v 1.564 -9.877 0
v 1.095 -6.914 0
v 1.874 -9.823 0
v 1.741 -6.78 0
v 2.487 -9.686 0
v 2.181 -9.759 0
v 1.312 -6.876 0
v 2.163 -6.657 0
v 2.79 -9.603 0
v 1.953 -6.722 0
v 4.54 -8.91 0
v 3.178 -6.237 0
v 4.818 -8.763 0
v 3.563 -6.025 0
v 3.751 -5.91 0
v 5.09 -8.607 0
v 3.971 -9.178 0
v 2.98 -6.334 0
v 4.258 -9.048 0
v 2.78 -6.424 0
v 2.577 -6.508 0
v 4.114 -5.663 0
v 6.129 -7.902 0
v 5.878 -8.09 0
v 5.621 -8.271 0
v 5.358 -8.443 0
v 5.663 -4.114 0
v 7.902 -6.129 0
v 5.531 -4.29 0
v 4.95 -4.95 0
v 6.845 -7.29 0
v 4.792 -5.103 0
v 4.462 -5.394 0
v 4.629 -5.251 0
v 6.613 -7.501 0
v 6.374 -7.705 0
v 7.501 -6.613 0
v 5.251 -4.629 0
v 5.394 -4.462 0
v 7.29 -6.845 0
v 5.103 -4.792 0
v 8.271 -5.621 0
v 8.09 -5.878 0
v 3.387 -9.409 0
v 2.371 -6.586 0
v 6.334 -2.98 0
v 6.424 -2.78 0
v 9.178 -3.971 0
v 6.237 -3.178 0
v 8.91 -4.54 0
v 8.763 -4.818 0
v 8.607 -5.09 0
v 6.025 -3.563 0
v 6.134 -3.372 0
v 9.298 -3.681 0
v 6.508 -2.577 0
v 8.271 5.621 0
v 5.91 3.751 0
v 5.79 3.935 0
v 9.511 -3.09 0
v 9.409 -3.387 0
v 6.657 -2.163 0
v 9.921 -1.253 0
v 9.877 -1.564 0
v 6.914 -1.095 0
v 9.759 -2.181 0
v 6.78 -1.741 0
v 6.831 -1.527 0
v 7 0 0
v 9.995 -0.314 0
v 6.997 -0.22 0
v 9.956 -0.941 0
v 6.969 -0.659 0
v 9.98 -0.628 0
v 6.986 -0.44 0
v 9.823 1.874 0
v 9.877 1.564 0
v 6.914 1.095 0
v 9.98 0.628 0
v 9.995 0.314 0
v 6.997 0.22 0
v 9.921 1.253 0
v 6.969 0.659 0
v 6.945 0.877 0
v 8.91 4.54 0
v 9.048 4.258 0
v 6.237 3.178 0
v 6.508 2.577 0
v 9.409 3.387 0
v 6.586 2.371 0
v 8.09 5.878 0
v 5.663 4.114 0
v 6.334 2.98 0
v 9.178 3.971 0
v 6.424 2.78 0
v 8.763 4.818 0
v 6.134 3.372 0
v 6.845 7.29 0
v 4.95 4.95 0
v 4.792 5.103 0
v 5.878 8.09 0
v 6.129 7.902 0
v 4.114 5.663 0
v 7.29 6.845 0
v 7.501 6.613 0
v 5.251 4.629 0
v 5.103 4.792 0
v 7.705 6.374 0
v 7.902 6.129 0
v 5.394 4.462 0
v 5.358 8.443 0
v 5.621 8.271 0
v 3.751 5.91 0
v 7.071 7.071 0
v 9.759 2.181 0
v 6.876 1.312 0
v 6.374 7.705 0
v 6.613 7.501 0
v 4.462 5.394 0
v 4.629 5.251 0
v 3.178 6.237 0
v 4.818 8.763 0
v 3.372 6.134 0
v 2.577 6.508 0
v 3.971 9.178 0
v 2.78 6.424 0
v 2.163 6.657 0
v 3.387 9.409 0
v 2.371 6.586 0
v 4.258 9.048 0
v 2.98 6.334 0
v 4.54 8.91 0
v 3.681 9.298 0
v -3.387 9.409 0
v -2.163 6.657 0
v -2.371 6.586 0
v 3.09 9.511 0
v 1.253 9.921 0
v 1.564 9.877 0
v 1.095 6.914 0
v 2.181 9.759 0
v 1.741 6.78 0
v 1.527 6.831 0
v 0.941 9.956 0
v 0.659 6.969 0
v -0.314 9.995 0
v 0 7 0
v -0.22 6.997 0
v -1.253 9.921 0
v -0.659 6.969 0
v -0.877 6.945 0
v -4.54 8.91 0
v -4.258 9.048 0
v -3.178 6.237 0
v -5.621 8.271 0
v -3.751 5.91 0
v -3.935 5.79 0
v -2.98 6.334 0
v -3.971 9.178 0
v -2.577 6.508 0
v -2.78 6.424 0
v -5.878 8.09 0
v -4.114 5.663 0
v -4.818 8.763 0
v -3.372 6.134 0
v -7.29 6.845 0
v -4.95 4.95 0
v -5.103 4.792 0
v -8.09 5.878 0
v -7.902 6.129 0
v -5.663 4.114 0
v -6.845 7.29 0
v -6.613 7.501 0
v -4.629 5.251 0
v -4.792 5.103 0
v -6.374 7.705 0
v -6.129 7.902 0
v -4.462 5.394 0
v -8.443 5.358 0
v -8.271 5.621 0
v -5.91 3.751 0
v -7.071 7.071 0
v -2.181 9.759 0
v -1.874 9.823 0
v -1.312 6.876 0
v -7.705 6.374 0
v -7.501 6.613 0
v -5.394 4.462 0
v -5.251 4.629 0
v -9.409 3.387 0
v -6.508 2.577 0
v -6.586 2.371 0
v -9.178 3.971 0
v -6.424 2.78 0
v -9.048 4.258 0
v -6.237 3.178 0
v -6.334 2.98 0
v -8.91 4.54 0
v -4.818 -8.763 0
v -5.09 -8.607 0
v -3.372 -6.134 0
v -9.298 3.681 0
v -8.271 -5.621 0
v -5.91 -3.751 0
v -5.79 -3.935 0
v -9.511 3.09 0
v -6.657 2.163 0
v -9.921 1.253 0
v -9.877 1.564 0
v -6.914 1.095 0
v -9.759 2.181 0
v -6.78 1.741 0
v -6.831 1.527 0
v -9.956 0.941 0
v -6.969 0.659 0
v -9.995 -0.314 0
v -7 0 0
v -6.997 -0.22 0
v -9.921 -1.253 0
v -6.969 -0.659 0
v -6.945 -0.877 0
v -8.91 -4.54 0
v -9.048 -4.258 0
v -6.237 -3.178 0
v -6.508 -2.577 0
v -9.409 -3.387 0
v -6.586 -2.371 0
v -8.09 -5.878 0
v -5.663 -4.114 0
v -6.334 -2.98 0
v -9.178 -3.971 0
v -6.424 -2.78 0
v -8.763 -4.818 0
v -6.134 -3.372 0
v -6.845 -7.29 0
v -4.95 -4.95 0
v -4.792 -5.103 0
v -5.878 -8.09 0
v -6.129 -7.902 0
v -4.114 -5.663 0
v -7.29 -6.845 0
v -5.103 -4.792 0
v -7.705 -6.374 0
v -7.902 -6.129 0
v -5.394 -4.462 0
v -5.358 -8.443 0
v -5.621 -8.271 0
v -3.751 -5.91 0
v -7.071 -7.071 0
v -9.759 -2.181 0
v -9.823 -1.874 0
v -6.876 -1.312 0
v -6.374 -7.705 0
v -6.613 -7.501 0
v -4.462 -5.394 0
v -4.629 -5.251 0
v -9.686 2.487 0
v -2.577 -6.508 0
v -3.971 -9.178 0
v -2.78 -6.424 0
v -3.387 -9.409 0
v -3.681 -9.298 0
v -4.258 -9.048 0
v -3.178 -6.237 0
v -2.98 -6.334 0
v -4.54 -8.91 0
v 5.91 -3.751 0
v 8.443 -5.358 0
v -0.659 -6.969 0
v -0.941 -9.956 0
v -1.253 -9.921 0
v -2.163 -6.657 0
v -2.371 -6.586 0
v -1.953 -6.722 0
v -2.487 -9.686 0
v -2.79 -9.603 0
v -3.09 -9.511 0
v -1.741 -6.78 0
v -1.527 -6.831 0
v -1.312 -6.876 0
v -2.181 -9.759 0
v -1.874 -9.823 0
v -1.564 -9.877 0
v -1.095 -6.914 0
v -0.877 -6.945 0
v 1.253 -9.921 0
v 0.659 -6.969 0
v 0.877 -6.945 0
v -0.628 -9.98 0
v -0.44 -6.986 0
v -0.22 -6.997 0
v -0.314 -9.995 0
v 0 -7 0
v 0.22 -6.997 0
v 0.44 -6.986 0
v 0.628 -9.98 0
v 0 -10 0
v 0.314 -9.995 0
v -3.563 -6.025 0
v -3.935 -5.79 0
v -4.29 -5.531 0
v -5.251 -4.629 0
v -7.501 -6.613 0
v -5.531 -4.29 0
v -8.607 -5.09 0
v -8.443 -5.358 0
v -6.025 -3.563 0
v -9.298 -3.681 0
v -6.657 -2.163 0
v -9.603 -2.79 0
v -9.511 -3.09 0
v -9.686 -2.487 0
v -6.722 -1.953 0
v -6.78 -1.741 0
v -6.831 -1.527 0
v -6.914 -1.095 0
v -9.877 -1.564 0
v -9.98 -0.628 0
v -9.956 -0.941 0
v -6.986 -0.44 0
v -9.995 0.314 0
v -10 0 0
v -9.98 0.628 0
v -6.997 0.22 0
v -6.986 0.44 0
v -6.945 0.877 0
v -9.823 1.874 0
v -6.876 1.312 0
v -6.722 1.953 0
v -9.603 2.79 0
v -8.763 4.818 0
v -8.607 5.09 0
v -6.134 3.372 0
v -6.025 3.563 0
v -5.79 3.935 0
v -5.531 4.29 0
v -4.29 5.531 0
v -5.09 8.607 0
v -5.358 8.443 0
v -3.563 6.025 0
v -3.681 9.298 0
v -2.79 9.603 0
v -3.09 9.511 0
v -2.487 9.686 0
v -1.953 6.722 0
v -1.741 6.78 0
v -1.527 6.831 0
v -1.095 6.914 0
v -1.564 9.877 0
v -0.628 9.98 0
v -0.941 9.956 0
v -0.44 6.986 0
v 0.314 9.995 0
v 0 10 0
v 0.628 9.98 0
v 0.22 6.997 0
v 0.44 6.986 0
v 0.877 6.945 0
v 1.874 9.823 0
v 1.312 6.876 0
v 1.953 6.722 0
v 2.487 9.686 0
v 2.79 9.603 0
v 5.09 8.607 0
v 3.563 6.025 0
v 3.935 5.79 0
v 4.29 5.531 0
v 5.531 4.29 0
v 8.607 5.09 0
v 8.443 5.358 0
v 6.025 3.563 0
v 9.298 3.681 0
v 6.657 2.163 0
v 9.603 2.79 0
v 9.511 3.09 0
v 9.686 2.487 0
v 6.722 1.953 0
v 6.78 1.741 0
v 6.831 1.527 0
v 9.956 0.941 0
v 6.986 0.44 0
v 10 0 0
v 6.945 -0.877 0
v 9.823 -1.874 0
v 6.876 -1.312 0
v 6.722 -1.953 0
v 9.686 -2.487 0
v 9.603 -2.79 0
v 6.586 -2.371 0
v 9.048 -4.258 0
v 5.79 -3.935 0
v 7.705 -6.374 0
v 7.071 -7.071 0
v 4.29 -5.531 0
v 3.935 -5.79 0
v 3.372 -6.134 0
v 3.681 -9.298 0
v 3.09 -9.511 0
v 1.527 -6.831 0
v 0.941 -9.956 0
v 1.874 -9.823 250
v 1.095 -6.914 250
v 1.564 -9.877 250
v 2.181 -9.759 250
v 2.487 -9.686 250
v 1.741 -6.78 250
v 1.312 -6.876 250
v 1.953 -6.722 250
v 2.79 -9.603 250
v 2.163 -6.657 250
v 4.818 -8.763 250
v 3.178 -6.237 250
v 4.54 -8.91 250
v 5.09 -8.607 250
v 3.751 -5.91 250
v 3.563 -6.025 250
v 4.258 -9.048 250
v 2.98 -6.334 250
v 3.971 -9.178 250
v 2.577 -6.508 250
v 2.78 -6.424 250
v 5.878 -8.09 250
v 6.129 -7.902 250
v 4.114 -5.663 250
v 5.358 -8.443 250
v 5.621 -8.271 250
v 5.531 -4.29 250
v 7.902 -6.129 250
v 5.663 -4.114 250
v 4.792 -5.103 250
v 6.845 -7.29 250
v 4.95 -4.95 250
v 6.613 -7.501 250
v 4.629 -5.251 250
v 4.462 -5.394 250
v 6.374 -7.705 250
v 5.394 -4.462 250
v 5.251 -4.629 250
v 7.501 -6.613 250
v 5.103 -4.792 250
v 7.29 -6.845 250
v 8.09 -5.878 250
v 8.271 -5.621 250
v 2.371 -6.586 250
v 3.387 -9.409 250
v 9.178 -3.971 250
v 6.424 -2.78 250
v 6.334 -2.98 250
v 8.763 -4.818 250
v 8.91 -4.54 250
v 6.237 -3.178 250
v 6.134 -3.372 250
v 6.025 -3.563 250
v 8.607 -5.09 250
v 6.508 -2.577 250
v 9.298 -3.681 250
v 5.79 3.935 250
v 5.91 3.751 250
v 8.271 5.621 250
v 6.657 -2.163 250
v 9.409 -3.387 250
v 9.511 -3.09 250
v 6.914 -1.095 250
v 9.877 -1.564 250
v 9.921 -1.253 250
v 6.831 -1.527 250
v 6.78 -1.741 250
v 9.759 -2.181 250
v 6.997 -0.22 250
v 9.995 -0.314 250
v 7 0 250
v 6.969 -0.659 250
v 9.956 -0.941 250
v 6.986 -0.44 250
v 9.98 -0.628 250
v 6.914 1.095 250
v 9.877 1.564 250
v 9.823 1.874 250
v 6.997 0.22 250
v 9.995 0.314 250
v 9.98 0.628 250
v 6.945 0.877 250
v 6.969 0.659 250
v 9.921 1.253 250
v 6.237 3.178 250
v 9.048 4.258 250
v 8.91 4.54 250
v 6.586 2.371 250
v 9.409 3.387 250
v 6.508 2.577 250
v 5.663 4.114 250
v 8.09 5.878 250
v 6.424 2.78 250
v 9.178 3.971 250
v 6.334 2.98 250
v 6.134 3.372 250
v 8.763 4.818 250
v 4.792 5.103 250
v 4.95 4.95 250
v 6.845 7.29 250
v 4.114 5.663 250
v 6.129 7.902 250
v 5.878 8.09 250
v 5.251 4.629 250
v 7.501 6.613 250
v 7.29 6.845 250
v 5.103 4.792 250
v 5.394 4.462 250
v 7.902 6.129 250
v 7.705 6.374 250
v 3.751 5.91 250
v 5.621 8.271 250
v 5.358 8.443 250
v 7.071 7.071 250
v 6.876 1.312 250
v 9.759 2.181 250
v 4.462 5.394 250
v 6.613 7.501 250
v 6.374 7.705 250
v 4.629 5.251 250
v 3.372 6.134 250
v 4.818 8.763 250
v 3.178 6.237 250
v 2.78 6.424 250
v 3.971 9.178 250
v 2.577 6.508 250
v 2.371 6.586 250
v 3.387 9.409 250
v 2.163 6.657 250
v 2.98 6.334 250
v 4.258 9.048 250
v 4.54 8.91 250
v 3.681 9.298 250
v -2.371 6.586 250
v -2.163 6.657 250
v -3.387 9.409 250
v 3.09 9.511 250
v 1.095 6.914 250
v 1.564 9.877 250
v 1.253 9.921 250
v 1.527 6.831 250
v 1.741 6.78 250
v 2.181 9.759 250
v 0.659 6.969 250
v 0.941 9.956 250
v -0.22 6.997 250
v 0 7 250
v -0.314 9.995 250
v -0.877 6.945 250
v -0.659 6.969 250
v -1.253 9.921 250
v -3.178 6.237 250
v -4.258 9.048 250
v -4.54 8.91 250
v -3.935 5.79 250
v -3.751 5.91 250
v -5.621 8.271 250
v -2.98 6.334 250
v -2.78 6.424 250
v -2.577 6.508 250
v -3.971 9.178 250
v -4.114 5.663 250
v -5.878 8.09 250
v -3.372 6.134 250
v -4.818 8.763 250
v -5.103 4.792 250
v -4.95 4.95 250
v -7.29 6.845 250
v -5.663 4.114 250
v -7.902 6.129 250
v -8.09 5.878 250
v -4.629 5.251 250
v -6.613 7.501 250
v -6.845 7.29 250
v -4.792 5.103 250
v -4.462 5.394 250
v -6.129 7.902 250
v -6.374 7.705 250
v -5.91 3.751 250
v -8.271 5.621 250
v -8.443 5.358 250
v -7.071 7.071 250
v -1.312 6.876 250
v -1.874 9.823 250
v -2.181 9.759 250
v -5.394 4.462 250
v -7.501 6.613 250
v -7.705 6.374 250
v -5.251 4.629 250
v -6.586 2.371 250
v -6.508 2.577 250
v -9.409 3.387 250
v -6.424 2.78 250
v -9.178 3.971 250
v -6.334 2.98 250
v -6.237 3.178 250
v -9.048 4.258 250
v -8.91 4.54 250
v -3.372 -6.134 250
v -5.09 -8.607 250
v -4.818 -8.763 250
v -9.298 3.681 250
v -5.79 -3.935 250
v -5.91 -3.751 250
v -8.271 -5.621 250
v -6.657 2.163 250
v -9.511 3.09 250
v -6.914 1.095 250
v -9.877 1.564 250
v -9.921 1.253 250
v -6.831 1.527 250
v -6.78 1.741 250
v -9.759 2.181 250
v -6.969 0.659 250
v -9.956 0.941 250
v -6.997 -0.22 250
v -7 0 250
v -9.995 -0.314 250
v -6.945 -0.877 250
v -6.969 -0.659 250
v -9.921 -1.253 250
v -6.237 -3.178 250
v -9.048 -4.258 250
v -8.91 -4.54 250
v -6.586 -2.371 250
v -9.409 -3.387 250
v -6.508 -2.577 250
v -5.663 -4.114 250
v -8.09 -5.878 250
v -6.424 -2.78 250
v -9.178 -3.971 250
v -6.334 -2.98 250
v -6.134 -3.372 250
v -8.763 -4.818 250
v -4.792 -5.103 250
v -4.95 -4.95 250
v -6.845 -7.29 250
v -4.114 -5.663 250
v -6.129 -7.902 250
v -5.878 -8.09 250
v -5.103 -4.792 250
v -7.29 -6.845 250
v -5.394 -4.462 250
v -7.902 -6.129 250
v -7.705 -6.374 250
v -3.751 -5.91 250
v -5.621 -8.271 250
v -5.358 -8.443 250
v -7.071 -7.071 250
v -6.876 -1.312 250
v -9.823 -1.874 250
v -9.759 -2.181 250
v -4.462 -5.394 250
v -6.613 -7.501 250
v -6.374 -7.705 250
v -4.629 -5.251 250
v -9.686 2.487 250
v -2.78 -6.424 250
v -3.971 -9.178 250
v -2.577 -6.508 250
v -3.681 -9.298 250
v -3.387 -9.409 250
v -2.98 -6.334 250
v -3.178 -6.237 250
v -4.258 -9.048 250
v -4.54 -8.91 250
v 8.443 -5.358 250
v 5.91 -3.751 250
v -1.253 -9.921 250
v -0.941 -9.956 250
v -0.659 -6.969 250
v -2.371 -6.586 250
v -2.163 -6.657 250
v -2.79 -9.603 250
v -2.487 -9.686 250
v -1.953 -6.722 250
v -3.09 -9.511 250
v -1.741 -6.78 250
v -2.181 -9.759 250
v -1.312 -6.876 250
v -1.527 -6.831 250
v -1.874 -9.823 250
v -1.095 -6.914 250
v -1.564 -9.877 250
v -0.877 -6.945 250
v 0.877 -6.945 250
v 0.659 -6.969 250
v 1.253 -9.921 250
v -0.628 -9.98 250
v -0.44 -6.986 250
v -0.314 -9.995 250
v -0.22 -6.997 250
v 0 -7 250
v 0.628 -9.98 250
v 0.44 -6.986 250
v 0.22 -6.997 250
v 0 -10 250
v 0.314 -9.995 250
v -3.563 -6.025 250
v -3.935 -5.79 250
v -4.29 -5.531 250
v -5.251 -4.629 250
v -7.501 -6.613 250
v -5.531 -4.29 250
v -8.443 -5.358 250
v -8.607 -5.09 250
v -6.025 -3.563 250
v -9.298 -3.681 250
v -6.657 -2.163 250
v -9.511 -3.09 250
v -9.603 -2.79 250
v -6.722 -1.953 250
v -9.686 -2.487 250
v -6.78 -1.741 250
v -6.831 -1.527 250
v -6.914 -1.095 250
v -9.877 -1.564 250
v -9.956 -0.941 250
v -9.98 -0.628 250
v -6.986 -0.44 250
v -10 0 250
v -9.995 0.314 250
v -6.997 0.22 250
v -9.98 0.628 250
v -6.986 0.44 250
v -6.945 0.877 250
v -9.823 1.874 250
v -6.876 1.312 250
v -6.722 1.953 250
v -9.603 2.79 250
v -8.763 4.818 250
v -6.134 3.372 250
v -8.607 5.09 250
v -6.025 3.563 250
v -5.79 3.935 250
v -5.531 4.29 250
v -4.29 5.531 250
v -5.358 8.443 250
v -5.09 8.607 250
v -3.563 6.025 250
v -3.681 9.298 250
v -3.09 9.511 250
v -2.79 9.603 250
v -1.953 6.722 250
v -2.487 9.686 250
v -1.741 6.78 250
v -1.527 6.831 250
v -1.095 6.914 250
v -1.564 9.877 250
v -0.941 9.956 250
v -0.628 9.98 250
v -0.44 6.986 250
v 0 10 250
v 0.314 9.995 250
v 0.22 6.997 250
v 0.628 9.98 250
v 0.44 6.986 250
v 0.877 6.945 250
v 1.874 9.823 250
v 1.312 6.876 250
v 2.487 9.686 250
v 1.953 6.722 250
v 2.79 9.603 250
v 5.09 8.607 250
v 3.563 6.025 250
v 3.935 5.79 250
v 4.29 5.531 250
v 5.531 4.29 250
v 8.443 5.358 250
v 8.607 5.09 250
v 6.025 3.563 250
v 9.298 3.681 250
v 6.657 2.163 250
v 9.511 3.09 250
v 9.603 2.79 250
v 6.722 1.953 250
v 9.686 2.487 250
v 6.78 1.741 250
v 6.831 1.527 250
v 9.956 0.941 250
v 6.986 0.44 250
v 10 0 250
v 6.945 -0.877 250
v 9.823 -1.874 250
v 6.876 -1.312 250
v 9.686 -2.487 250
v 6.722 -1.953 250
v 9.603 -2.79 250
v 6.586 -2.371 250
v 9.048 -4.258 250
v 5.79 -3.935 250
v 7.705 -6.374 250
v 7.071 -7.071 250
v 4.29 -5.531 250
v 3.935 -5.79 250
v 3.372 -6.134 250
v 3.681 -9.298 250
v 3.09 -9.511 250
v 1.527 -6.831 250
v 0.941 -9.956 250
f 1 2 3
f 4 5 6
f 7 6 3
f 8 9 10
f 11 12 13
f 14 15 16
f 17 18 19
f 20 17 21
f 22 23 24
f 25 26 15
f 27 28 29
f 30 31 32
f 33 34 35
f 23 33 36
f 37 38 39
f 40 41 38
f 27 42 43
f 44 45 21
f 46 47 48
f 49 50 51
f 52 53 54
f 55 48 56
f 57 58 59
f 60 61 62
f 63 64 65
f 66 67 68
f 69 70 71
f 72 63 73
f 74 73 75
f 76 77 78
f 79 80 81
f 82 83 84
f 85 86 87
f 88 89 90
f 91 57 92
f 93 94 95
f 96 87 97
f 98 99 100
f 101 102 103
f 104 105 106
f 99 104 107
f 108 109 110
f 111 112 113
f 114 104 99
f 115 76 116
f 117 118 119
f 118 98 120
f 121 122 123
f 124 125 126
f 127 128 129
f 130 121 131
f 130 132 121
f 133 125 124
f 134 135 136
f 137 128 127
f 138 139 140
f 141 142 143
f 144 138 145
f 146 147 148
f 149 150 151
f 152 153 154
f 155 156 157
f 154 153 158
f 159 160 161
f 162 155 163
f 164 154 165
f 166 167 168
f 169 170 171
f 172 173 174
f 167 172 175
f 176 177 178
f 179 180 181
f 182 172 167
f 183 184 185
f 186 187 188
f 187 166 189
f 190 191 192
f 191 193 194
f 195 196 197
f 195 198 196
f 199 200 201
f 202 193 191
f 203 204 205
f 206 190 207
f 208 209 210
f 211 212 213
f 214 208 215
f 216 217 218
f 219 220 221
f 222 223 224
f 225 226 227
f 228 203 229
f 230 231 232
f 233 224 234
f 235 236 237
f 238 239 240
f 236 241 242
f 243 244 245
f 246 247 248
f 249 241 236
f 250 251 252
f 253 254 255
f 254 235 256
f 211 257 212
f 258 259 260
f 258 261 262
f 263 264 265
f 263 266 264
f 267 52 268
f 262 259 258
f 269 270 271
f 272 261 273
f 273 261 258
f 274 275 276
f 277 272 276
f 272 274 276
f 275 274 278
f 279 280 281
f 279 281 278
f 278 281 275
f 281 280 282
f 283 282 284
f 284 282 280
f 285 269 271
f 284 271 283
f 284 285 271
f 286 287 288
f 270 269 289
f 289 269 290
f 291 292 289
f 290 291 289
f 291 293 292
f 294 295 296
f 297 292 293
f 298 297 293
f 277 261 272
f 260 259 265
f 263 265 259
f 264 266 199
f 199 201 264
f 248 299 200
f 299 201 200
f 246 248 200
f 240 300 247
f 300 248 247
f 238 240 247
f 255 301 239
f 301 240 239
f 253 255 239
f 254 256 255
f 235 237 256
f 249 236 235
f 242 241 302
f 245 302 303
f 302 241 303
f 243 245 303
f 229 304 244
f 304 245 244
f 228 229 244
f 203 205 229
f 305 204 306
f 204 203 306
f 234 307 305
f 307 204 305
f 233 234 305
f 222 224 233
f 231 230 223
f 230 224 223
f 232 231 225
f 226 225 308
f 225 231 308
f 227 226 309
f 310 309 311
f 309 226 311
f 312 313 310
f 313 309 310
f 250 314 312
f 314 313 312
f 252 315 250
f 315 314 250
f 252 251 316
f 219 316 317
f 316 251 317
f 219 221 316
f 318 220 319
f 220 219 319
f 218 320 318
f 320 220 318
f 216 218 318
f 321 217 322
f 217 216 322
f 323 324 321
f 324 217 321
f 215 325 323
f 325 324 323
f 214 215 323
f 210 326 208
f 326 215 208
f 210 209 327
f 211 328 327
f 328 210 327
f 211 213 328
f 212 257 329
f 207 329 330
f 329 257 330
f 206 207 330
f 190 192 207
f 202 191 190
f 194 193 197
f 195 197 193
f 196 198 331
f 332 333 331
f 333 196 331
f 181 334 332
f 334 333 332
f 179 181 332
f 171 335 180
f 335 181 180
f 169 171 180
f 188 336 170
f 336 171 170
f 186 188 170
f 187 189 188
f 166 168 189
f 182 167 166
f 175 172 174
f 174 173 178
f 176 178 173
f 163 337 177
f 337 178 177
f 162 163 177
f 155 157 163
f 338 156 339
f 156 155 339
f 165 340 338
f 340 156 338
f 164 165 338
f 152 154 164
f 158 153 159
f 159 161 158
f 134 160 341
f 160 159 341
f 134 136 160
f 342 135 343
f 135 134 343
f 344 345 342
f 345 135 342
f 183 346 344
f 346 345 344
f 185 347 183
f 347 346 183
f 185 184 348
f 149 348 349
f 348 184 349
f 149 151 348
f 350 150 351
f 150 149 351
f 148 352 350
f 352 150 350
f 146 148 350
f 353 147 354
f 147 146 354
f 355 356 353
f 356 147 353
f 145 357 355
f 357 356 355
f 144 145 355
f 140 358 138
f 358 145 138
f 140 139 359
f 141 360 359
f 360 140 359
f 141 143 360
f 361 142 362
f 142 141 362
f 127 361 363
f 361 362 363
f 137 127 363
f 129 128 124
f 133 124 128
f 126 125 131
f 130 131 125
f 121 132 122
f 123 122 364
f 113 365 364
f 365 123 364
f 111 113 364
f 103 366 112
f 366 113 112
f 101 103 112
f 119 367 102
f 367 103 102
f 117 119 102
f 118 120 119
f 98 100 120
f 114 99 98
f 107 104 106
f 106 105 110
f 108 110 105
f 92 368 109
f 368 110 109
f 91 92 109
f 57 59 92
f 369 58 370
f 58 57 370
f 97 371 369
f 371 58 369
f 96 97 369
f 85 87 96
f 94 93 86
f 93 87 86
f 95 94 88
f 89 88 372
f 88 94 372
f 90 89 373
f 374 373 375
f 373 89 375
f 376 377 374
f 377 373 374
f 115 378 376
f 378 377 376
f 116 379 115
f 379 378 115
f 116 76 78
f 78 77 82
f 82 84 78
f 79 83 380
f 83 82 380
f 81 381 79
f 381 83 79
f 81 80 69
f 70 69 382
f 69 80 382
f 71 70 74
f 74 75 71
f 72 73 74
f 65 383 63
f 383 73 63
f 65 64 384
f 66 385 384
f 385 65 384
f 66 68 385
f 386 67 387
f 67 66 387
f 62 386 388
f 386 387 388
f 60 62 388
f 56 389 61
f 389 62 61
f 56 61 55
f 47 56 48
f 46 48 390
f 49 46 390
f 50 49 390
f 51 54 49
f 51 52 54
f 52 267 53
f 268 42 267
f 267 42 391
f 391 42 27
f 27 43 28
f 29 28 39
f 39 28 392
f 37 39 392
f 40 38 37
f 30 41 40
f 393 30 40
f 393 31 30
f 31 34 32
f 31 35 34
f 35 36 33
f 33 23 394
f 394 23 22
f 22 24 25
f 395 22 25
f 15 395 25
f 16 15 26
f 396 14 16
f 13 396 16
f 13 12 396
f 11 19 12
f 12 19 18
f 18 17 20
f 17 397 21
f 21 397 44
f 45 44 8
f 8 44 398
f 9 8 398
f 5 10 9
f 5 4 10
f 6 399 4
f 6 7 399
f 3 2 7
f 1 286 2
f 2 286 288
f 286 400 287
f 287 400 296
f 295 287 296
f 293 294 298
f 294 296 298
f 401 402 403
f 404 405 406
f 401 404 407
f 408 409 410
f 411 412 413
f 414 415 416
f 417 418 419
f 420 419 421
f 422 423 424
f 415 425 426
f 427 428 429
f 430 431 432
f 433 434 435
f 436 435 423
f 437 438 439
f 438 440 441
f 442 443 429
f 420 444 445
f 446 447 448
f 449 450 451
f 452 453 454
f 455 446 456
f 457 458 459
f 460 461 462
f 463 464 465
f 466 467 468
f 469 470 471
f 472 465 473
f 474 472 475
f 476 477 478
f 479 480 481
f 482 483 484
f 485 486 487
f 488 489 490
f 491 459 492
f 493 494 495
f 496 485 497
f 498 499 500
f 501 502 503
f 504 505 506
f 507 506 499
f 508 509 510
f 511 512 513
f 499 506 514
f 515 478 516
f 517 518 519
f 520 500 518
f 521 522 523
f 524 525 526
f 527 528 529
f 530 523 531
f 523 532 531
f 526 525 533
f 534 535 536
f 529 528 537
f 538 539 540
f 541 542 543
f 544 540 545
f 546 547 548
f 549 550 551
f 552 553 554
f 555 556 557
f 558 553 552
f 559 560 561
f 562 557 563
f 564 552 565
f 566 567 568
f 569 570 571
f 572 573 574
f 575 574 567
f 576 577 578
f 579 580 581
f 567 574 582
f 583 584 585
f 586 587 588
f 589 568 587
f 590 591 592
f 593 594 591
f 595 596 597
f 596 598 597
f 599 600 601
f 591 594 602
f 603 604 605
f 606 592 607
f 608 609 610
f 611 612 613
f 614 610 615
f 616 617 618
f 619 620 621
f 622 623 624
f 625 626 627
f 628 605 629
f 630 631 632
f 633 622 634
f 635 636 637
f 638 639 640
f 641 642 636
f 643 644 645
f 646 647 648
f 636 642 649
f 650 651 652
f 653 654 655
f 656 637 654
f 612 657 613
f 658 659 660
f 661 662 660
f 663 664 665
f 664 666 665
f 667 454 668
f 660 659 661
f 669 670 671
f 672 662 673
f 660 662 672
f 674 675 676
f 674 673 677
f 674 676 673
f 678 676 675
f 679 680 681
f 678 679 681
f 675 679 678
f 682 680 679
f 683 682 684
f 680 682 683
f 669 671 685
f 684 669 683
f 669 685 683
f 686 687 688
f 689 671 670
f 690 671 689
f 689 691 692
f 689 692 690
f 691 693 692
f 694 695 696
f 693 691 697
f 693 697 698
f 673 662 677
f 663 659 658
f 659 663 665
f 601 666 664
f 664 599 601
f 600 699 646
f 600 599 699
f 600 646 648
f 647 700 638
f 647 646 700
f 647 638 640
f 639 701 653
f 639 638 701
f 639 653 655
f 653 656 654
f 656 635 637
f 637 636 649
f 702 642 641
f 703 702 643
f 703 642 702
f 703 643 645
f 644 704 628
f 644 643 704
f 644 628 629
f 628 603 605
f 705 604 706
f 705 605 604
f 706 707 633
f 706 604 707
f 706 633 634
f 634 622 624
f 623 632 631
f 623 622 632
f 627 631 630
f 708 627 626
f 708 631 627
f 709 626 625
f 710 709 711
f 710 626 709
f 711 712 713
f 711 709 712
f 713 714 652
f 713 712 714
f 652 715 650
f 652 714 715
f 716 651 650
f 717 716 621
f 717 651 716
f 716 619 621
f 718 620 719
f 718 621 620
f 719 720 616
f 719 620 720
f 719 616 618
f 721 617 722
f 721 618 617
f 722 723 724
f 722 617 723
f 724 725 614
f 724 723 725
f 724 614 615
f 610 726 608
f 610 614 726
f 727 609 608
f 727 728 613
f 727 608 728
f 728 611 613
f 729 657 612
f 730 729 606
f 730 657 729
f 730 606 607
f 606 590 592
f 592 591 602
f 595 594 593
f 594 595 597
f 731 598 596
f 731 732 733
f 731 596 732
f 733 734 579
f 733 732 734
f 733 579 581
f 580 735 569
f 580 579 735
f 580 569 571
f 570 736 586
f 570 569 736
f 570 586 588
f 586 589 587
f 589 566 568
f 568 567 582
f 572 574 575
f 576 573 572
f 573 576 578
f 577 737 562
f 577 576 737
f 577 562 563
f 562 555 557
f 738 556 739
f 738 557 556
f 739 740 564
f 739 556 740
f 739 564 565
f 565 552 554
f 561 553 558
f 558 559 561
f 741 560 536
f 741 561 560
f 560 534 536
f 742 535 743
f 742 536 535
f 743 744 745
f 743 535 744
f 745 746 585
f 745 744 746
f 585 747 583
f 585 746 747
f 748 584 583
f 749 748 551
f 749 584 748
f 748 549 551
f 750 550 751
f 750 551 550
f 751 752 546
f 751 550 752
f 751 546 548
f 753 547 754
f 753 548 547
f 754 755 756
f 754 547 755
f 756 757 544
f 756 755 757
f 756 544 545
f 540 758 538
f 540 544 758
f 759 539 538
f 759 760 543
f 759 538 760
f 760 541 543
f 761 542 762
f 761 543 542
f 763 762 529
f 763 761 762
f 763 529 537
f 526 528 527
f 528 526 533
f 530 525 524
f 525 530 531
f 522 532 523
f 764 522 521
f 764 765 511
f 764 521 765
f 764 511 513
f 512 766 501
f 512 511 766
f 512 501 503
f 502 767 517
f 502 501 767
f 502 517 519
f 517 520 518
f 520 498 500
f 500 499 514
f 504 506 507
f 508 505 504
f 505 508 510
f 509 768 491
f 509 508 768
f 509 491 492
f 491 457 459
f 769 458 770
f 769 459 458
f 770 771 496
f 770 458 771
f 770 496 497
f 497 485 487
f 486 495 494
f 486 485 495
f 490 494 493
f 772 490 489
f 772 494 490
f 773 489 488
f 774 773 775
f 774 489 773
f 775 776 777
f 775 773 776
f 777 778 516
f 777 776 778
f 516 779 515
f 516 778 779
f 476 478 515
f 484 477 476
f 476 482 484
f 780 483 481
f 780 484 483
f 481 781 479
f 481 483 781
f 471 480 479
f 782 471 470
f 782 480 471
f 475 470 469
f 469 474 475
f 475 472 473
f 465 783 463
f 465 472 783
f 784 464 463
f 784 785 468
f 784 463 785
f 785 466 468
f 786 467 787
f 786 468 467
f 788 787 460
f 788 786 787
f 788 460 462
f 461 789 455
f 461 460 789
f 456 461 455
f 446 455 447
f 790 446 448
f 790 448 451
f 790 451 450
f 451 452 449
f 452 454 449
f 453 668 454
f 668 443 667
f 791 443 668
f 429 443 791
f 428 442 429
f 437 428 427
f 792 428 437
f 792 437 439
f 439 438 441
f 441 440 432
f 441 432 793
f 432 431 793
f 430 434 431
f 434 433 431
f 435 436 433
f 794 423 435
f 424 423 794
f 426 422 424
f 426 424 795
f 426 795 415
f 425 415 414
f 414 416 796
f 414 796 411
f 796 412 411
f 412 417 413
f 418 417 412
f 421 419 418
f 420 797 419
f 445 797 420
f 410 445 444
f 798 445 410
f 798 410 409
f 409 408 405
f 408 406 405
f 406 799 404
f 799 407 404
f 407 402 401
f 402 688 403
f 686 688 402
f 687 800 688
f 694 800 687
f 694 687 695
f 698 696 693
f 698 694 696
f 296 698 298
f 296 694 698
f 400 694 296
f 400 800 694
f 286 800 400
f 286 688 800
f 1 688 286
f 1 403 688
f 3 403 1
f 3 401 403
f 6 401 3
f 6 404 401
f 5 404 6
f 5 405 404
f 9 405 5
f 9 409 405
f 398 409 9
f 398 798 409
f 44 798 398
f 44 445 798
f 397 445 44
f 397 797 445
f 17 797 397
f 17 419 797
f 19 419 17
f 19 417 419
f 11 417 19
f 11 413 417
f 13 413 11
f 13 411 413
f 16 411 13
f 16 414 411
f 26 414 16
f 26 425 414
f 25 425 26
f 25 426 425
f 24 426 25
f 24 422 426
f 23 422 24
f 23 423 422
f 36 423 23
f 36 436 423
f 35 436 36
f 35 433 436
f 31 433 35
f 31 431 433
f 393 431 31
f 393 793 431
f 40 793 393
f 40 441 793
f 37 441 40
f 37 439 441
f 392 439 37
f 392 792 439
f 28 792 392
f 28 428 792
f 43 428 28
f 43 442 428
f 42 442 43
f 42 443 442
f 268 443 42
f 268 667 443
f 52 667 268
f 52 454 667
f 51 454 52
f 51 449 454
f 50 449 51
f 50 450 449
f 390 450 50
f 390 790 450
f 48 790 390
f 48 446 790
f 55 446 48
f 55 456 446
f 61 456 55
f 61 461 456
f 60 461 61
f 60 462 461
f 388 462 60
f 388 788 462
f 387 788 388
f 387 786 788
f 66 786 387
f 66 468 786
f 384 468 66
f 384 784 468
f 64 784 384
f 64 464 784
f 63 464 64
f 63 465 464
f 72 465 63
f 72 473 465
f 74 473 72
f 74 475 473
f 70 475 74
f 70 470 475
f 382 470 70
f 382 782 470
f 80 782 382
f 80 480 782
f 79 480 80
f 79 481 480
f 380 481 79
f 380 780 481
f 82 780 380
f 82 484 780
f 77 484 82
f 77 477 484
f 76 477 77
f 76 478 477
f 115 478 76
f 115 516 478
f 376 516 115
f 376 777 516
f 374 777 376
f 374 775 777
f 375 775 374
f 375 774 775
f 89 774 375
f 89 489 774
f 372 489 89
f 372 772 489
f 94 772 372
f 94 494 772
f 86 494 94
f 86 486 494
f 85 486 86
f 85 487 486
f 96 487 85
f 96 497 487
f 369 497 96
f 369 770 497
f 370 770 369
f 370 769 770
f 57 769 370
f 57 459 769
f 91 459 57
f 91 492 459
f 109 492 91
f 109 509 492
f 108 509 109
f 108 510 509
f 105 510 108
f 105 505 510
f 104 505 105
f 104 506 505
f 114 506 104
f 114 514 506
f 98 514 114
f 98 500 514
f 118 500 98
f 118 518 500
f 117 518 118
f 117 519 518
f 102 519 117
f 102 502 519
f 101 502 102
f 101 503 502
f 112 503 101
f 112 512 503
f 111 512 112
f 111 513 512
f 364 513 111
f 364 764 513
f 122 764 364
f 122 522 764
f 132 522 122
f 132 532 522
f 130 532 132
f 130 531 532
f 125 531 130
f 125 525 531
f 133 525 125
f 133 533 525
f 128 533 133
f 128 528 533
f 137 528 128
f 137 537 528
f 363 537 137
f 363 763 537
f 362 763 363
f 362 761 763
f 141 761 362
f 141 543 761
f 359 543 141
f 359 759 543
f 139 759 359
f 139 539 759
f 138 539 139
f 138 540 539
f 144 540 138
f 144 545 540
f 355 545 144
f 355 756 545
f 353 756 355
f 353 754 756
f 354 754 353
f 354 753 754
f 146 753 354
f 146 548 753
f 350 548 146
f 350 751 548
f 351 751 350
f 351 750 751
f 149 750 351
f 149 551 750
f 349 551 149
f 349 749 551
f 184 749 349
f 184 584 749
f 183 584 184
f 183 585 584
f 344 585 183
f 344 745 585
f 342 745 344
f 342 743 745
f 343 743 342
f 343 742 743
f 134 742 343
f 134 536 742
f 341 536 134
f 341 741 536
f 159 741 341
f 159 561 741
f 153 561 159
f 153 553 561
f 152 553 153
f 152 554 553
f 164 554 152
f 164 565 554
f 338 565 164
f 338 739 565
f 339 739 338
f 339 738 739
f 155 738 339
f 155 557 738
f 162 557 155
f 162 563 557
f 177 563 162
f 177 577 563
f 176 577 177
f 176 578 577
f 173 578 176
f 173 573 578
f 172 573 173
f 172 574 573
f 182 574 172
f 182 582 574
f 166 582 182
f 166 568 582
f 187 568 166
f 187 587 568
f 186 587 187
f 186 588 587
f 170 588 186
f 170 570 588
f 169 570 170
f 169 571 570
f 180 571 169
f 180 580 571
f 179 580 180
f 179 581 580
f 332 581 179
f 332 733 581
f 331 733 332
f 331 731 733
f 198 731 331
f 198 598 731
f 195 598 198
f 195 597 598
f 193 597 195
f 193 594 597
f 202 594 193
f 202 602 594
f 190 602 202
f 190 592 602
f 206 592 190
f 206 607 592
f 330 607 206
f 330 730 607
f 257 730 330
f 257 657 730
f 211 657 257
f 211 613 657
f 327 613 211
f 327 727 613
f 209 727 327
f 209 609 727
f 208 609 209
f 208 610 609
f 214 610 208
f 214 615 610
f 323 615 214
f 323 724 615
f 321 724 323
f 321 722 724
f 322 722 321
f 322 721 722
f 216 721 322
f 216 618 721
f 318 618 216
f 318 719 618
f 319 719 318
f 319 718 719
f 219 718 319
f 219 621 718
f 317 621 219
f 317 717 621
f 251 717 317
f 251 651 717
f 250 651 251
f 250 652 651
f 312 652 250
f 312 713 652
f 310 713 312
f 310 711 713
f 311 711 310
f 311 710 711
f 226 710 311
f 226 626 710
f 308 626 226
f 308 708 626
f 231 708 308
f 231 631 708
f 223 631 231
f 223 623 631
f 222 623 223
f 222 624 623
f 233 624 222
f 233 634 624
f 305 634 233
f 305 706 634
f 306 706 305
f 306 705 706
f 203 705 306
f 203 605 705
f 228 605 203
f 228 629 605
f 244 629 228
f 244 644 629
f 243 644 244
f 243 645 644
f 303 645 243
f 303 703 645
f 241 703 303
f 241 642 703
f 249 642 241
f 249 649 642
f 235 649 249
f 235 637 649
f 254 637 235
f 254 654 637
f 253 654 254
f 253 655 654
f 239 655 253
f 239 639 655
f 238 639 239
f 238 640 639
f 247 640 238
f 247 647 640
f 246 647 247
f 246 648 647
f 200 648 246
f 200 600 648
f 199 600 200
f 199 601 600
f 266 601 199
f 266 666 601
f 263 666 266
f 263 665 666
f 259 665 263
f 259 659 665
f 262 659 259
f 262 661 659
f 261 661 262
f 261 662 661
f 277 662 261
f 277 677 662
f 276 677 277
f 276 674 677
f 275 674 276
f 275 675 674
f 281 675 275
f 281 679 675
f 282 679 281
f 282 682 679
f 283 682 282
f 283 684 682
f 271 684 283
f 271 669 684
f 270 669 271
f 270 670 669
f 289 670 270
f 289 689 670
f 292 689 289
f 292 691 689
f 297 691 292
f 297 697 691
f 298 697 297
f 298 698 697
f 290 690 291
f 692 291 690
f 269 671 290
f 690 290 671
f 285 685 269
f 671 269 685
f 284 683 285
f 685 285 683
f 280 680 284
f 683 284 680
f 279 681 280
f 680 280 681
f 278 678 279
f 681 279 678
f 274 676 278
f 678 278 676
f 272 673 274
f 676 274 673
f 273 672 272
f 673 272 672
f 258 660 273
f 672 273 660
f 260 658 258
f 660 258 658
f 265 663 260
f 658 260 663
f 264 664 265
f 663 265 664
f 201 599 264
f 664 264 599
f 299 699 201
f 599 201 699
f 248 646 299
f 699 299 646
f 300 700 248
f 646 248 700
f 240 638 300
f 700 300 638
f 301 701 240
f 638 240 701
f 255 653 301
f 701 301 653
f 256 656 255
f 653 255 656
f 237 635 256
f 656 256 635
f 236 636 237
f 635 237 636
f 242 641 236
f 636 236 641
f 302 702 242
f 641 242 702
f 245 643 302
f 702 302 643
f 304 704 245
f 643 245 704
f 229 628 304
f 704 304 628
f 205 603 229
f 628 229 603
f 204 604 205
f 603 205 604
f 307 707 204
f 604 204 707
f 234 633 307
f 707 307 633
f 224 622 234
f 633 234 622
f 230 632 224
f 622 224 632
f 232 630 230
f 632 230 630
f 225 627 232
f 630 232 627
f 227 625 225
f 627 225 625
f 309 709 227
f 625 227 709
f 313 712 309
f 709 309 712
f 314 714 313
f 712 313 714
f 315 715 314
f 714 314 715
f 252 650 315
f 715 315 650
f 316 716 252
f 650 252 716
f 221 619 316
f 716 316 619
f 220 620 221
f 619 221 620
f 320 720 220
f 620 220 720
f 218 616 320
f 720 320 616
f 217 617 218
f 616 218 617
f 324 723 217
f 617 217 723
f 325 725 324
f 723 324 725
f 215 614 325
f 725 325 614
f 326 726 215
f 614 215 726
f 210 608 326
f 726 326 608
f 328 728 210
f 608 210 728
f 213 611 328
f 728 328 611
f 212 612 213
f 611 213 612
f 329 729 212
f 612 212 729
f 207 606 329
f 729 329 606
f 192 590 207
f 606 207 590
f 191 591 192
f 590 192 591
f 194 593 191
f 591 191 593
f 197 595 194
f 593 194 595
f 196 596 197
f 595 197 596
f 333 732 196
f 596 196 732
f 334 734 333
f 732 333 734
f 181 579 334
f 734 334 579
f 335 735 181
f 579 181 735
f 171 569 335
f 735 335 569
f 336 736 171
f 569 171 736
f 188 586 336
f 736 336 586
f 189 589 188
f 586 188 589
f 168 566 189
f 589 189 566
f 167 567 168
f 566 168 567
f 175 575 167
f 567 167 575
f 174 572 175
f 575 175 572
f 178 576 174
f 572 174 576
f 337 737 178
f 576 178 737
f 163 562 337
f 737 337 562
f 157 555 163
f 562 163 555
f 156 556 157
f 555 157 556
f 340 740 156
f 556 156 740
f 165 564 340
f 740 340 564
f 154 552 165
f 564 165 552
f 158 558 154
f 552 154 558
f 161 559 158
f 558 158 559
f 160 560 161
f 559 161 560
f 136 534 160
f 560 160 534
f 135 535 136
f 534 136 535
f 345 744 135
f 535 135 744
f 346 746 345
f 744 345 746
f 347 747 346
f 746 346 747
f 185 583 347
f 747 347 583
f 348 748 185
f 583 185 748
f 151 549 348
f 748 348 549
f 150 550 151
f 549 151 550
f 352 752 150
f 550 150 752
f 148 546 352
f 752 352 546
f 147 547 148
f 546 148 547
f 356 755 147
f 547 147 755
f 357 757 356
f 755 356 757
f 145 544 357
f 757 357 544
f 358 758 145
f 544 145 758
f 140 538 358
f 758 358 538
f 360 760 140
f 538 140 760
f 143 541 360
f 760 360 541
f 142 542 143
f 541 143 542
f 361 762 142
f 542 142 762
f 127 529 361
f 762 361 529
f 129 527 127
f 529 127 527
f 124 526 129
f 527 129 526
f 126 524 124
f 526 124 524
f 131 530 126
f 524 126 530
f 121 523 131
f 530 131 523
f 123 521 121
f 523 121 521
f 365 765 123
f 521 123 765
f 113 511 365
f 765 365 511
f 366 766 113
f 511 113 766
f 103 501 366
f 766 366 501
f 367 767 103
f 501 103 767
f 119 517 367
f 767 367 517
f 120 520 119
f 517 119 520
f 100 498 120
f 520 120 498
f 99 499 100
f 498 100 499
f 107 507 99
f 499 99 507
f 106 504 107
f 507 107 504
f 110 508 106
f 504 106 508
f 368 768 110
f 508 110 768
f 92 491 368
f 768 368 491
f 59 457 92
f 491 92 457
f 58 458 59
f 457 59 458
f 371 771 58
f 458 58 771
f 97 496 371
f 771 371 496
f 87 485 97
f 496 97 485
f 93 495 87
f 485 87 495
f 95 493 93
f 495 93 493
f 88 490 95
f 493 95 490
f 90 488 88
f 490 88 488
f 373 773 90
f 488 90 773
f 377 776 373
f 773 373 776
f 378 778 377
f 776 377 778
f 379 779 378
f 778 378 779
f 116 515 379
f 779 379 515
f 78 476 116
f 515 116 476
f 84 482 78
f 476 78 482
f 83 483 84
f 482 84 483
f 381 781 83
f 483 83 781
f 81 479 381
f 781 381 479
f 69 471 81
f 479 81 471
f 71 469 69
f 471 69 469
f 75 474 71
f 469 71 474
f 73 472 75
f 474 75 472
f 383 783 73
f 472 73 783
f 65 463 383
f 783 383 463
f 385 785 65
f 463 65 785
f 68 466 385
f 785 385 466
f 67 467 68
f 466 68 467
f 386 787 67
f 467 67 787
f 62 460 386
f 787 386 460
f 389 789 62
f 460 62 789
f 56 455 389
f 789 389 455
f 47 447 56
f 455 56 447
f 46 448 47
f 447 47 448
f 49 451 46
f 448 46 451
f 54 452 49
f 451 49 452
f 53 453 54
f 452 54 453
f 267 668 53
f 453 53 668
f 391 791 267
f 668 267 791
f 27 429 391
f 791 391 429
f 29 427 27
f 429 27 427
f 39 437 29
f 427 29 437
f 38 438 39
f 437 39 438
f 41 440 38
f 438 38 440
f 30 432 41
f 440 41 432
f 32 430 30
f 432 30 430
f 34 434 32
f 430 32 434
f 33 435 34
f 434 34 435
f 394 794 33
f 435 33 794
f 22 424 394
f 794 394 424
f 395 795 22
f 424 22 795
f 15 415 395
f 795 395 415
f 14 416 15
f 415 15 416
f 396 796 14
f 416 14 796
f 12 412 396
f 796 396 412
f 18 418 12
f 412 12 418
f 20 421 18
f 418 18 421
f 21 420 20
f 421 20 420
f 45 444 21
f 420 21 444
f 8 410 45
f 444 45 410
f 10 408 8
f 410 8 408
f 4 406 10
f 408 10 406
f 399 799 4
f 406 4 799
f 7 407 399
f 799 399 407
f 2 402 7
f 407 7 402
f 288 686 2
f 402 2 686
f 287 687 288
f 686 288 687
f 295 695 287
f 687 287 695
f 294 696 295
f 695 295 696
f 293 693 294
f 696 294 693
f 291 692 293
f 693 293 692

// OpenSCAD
$fn=200;
linear_extrude(250) difference(){
    circle(20/2);
    circle(14/2);
}
